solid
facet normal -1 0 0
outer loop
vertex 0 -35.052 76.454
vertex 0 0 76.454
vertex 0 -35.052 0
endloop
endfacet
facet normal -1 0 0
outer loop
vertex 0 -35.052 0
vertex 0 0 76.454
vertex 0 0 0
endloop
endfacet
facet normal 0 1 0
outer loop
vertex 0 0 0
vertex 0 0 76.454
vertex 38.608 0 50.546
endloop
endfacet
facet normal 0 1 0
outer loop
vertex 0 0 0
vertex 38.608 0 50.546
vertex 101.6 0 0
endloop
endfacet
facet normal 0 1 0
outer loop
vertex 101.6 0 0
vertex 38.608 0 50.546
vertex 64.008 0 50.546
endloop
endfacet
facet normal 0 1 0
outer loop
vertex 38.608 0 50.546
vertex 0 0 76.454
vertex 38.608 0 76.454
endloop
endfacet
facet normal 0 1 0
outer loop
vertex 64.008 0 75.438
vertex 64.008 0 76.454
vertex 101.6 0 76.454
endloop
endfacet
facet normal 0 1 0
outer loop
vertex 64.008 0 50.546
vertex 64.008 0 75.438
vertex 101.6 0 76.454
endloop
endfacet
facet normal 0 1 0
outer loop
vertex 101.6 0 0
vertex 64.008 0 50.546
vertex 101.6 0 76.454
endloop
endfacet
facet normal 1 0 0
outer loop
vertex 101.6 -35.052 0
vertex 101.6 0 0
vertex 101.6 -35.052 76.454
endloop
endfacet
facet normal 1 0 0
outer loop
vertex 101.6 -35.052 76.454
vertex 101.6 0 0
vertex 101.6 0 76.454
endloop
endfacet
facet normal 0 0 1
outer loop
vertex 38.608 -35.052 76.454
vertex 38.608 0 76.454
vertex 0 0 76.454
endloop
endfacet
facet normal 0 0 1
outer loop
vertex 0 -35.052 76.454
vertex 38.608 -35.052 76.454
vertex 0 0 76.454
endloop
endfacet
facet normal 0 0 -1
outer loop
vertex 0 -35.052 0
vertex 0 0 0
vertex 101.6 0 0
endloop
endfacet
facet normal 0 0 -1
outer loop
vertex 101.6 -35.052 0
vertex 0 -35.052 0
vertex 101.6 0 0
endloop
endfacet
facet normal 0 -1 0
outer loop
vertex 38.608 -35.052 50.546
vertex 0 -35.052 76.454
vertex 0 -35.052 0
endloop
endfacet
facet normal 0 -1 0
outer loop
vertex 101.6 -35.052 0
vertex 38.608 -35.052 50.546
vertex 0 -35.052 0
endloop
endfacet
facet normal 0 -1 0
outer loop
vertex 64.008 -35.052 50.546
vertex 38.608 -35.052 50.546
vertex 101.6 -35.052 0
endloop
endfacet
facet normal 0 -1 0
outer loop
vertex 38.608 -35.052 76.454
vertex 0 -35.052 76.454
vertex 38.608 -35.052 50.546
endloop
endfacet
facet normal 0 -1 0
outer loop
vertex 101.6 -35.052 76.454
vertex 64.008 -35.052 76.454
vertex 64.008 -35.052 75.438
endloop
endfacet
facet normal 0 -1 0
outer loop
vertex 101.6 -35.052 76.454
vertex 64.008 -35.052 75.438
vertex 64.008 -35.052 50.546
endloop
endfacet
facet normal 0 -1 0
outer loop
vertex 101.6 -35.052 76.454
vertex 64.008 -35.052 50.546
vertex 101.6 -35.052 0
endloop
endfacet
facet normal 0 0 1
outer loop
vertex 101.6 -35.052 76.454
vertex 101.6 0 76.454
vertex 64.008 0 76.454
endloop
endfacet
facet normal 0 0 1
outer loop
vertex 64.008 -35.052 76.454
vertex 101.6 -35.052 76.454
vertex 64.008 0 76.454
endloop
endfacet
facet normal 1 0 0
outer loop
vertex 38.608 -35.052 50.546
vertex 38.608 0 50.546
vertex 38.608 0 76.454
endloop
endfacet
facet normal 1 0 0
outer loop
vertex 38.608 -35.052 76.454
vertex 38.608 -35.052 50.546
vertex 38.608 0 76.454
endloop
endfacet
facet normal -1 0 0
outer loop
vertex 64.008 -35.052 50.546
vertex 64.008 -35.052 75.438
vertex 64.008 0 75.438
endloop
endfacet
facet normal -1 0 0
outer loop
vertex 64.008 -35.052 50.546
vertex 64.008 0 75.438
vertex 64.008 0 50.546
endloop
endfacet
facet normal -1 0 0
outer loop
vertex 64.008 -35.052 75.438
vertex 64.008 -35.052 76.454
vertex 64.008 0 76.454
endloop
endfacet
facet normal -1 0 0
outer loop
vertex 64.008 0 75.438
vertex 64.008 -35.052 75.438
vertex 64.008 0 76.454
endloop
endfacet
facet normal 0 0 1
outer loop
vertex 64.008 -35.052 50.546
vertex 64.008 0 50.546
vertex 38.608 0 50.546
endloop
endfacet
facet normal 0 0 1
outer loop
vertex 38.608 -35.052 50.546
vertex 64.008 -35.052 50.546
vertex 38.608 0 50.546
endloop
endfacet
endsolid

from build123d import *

# Parameters (mm, degrees)
F1_DEPTH    = 35.052
F1_FACE_W   = 38.608
F1_FACE_H   = 35.052
F1_FACE_W_2 = 37.592001
F2_DEPTH    = 1.016
F4_DEPTH    = 91.948


with BuildPart() as f1:
    # F0 (on Front) → F1 (new body)
    with BuildSketch(Plane.XZ):
        Polygon((0, 76.453999), (0, 0), (101.600006, 0), (101.600006, 76.453999), (64.008005, 76.453999), (64.008005, 50.546002), (38.608, 50.546002), (38.608, 76.453999), align=None)
    extrude(amount=F1_DEPTH)

    # F1_face (on face) → F2 (join)
    with BuildSketch(Plane(origin=(19.304, -17.526, 76.453999), x_dir=(1, 0, 0), z_dir=(0, 0, 1))):
        Rectangle(F1_FACE_W, F1_FACE_H)
        with Locations((63.500005, 0)):
            Rectangle(F1_FACE_W_2, F1_FACE_H)
    extrude(amount=-F2_DEPTH)


with BuildPart() as f4:
    # F3 (on face) → F4 (new body)
    with BuildSketch(Plane.XY.offset(76.453999)):
        Polygon((354.056151, 0), (354.056151, -101.6), (444.539875, -101.6), (444.539875, -47.334887), (531.121194, -47.334887), (522.471368, 0), (468.59476, 0), align=None)
    extrude(amount=-F4_DEPTH)


solid = f1.part
